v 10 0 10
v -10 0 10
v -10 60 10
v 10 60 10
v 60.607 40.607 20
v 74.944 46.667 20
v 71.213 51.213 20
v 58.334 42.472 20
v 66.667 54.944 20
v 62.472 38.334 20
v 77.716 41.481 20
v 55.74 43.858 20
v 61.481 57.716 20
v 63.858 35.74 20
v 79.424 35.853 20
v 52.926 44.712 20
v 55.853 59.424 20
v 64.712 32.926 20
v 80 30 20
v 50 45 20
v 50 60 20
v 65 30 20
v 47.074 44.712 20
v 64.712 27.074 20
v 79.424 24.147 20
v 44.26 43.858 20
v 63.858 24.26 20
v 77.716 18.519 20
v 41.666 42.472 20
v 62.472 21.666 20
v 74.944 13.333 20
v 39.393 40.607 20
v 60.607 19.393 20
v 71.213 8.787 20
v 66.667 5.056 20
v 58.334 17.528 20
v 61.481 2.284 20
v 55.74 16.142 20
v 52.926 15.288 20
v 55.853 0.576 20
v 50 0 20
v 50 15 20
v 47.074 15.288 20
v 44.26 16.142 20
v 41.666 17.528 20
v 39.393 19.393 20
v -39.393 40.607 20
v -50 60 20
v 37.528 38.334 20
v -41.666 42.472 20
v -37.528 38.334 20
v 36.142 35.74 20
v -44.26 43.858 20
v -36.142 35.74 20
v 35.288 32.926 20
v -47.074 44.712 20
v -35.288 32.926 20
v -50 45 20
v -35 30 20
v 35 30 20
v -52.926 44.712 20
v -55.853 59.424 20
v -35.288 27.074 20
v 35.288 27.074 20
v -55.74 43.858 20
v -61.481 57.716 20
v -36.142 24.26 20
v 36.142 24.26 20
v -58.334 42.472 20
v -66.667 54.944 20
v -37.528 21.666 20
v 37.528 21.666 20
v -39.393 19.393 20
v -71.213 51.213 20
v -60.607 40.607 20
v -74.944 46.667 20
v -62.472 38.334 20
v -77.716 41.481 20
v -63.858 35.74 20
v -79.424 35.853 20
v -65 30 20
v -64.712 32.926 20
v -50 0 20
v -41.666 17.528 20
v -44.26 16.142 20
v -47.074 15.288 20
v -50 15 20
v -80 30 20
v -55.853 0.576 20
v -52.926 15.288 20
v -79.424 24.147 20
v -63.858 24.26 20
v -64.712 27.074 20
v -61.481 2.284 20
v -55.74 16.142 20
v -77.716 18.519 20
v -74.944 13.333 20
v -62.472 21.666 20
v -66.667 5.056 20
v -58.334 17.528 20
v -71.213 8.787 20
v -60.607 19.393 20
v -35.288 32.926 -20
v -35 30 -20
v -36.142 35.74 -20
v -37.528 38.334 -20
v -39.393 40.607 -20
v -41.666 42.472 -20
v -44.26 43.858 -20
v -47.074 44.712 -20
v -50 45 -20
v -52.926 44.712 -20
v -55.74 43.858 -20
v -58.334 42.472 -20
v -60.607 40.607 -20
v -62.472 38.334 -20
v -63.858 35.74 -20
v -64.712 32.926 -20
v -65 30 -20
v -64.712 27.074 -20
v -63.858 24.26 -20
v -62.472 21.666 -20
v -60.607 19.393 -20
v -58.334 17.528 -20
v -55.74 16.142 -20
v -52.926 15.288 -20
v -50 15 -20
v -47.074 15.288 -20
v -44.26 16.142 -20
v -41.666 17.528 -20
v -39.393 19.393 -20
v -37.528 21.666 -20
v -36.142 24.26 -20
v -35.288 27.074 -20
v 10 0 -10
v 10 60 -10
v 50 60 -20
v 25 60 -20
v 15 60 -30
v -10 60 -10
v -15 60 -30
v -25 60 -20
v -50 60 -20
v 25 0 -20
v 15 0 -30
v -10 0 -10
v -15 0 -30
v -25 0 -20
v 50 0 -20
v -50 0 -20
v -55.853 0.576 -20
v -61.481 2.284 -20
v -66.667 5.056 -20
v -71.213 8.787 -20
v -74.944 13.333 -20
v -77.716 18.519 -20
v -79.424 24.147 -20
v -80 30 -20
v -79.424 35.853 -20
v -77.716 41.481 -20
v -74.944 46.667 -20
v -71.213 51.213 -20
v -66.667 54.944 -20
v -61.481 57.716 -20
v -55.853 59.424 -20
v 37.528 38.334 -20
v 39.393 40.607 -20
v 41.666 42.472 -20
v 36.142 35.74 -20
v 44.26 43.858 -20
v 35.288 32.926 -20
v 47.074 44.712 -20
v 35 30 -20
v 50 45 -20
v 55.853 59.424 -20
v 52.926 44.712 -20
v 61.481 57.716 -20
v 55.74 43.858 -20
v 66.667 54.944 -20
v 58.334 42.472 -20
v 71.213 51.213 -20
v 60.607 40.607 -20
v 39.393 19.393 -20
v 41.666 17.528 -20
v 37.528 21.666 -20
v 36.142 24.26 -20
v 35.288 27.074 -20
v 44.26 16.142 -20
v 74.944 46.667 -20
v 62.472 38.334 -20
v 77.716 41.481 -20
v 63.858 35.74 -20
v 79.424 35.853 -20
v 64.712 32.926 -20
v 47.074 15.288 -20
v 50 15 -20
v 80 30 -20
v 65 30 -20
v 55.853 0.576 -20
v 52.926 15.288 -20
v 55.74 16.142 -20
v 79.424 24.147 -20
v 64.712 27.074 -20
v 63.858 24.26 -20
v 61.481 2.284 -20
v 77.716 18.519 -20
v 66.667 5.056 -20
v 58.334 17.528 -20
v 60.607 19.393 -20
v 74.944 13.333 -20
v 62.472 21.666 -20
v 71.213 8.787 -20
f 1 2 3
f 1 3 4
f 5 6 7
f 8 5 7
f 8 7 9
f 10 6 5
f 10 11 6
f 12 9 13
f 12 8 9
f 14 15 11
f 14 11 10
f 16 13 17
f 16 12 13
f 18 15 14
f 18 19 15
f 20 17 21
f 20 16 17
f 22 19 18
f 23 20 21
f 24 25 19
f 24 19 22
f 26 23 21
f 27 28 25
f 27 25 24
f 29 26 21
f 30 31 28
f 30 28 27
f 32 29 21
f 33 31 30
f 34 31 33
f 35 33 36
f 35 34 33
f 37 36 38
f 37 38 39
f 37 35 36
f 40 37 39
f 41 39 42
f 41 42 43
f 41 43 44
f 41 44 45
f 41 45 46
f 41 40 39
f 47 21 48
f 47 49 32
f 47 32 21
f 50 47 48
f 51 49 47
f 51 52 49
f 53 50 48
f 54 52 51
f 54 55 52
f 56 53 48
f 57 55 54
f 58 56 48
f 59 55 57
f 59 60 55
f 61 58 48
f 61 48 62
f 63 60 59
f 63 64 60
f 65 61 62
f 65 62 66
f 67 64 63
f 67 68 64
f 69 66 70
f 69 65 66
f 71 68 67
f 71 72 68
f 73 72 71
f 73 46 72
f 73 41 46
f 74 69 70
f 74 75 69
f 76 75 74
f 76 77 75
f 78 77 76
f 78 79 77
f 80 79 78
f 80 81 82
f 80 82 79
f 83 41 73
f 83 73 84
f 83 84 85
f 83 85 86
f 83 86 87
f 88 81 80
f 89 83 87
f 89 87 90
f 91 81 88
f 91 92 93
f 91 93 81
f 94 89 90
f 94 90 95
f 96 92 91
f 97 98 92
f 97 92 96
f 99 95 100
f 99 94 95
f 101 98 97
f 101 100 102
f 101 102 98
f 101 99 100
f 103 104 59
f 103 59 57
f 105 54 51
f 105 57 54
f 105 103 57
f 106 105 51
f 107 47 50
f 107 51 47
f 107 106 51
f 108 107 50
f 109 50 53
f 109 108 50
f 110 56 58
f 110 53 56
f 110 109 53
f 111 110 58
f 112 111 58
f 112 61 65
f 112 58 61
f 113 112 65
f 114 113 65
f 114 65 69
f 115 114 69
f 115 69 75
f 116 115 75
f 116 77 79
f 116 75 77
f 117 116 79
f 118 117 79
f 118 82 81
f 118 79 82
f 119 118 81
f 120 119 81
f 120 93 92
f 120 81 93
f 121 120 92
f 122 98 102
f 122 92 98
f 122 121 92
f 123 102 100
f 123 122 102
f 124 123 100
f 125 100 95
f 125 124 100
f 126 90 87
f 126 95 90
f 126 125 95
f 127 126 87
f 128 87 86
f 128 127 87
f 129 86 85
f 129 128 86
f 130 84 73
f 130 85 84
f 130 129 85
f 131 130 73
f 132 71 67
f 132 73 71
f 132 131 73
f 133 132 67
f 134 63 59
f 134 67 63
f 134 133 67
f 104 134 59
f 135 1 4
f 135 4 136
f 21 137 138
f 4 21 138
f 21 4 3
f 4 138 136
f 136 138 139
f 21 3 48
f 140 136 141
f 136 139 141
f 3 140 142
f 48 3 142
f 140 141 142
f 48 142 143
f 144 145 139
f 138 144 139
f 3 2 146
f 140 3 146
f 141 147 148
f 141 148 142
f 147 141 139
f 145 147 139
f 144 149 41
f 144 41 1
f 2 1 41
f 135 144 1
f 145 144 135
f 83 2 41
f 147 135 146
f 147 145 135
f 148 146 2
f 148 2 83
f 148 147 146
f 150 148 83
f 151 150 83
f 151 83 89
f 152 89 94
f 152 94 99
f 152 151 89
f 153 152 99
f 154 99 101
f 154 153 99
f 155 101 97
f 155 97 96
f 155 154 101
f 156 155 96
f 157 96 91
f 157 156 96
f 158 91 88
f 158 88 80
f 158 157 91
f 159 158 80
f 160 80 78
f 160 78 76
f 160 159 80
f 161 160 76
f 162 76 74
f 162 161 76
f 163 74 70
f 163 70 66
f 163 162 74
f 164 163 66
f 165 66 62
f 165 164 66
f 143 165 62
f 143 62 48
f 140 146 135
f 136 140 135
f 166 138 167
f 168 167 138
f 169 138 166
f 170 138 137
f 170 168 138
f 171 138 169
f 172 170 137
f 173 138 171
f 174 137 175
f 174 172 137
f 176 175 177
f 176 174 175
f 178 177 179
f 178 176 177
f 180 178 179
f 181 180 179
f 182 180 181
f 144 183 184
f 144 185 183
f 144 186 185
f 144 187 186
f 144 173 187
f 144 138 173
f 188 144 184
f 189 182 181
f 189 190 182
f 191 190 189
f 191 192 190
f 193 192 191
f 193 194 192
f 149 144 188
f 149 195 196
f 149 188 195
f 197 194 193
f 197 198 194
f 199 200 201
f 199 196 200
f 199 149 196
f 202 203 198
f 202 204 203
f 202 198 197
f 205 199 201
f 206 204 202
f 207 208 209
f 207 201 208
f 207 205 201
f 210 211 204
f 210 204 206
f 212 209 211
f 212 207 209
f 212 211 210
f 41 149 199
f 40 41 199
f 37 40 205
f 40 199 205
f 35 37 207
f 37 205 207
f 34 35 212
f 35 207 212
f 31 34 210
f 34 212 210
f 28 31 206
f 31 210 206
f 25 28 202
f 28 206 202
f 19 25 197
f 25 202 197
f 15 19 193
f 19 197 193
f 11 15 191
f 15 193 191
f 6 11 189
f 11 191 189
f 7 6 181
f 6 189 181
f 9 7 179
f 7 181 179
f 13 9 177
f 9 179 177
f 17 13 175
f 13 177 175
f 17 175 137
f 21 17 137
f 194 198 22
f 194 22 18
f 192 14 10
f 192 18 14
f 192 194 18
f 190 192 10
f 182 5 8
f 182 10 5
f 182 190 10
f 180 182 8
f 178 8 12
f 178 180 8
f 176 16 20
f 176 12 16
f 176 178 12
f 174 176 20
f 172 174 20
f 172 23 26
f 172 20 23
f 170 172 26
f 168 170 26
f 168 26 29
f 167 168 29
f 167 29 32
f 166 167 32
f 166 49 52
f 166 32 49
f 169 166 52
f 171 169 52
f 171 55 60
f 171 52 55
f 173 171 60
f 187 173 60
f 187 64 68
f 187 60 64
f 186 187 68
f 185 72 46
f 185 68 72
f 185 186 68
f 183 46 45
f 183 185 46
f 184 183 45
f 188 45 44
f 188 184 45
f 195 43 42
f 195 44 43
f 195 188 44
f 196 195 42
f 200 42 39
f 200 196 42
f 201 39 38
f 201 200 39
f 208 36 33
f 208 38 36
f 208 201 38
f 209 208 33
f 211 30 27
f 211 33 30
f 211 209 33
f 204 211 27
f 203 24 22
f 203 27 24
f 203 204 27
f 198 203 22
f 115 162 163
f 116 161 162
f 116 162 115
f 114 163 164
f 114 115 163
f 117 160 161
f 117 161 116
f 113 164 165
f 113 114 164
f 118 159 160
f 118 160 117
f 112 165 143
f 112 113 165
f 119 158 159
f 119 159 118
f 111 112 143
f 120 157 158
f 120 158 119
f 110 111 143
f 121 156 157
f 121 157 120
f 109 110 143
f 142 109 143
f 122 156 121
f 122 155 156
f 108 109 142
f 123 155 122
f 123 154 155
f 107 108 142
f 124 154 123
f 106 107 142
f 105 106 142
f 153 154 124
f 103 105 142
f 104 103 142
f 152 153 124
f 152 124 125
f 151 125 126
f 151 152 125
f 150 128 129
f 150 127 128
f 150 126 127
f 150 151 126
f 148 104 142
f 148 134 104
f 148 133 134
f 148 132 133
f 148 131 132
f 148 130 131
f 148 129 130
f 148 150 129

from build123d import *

# Parameters (mm, degrees)
SKETCH1_W               = 20
SKETCH1_H               = 20
BOSS_EXTRUDE1_DEPTH     = 60
CUT_EXTRUDE1_DEPTH      = 105.403065089
CUT_EXTRUDE1_DEPTH_BACK = 105.403065089
SKETCH2_R               = 15
CHAMFER2_SIZE           = 10


with BuildPart() as part:
    # Sketch1 → Boss-Extrude1 (new body)
    with BuildSketch(Plane(origin=(0, 0, 0), x_dir=(1, 0, 0), z_dir=(0, 1, 0))):
        Polygon((-15, 30), (15, 30), (15, 20), (80, 20), (80, -20), (-80, -20), (-80, 20), (-15, 20), align=None)
        Rectangle(SKETCH1_W, SKETCH1_H, mode=Mode.SUBTRACT)
    extrude(amount=BOSS_EXTRUDE1_DEPTH)

    # Sketch2 → Cut-Extrude1 (cut, two sides: drawn at the far end of the back side and taken through both)
    with BuildSketch(Plane.XY.offset(-CUT_EXTRUDE1_DEPTH_BACK)):
        with Locations((50, 30)):
            Circle(SKETCH2_R)
        with Locations((-50, 30)):
            Circle(SKETCH2_R)
        with BuildLine():
            Line((-50, 60), (-50, 75.524643477))
            Line((-50, 75.524643477), (-102.669470588, 75.524643477))
            Line((-102.669470588, 75.524643477), (-102.669470588, -8.464278737))
            Line((-102.669470588, -8.464278737), (-50, -8.464278737))
            Line((-50, -8.464278737), (-50, 0))
            ThreePointArc((-50, 0), (-80, 30), (-50, 60))
        make_face()
        with BuildLine():
            Line((102.669470588, -8.464278737), (50, -8.464278737))
            Line((50, -8.464278737), (50, 0))
            ThreePointArc((50, 0), (80, 30), (50, 60))
            Line((50, 60), (50, 75.524643477))
            Line((50, 75.524643477), (102.669470588, 75.524643477))
            Line((102.669470588, 75.524643477), (102.669470588, -8.464278737))
        make_face()
    extrude(amount=CUT_EXTRUDE1_DEPTH + CUT_EXTRUDE1_DEPTH_BACK, mode=Mode.SUBTRACT)

    # Chamfer2
    chamfer2_edges = [part.edges().sort_by_distance(p)[0] for p in [
        (15, 30, -20),
        (-15, 30, -20),
    ]]
    chamfer(chamfer2_edges, length=CHAMFER2_SIZE - 0.0001)  # a hair under: the kernel refuses the full size


solid = part.part
